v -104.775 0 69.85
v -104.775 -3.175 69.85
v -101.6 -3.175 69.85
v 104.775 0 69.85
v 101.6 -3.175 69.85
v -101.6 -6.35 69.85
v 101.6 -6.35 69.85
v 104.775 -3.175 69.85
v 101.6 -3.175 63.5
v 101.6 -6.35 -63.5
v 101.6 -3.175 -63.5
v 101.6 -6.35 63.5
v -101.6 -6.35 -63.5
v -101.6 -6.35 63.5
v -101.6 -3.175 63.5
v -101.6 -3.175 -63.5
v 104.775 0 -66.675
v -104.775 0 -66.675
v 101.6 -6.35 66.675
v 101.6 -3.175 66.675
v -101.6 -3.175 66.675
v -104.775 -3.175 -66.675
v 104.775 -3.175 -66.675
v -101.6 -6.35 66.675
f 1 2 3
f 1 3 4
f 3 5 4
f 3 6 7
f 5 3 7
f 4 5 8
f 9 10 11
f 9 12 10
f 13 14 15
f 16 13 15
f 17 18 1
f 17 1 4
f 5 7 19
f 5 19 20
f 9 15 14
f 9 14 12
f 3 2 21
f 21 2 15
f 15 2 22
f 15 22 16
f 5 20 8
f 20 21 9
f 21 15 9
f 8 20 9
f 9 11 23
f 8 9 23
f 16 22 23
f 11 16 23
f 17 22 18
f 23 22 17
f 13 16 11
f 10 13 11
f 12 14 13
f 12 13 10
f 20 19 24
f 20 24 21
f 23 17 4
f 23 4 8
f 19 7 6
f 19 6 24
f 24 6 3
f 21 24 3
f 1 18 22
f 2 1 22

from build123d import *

# Parameters (mm, degrees)
F0_W     = 203.2
F0_H     = 127
F1_DEPTH = 6.35
F2_W     = 3.175
F2_H     = 3.175
F3_DEPTH = 203.2
F4_W     = 3.175
F4_H     = 3.175
F5_DEPTH = 136.525


with BuildPart() as f1:
    # F0 (on Front) → F1 (new body)
    with BuildSketch(Plane.XZ):
        Rectangle(F0_W, F0_H)
    extrude(amount=F1_DEPTH)

    # F2 (on face) → F3 (join)
    with BuildSketch(Plane.YZ.offset(101.6)):
        Polygon((-3.175, 63.5), (0, 63.5), (0, 69.85), (-6.35, 69.85), (-6.35, 66.675), (-3.175, 66.675), align=None)
        with Locations((-1.5875, -65.0875)):
            Rectangle(F2_W, F2_H)
    extrude(amount=-F3_DEPTH)

    # F4 (on face) → F5 (join)
    with BuildSketch(Plane(origin=(0, 0, -66.675), x_dir=(1, 0, 0), z_dir=(0, 0, -1))):
        with Locations((-103.1875, 1.5875)):
            Rectangle(F4_W, F4_H)
        with Locations((103.1875, 1.5875)):
            Rectangle(F4_W, F4_H)
    extrude(amount=-F5_DEPTH)


solid = f1.part
